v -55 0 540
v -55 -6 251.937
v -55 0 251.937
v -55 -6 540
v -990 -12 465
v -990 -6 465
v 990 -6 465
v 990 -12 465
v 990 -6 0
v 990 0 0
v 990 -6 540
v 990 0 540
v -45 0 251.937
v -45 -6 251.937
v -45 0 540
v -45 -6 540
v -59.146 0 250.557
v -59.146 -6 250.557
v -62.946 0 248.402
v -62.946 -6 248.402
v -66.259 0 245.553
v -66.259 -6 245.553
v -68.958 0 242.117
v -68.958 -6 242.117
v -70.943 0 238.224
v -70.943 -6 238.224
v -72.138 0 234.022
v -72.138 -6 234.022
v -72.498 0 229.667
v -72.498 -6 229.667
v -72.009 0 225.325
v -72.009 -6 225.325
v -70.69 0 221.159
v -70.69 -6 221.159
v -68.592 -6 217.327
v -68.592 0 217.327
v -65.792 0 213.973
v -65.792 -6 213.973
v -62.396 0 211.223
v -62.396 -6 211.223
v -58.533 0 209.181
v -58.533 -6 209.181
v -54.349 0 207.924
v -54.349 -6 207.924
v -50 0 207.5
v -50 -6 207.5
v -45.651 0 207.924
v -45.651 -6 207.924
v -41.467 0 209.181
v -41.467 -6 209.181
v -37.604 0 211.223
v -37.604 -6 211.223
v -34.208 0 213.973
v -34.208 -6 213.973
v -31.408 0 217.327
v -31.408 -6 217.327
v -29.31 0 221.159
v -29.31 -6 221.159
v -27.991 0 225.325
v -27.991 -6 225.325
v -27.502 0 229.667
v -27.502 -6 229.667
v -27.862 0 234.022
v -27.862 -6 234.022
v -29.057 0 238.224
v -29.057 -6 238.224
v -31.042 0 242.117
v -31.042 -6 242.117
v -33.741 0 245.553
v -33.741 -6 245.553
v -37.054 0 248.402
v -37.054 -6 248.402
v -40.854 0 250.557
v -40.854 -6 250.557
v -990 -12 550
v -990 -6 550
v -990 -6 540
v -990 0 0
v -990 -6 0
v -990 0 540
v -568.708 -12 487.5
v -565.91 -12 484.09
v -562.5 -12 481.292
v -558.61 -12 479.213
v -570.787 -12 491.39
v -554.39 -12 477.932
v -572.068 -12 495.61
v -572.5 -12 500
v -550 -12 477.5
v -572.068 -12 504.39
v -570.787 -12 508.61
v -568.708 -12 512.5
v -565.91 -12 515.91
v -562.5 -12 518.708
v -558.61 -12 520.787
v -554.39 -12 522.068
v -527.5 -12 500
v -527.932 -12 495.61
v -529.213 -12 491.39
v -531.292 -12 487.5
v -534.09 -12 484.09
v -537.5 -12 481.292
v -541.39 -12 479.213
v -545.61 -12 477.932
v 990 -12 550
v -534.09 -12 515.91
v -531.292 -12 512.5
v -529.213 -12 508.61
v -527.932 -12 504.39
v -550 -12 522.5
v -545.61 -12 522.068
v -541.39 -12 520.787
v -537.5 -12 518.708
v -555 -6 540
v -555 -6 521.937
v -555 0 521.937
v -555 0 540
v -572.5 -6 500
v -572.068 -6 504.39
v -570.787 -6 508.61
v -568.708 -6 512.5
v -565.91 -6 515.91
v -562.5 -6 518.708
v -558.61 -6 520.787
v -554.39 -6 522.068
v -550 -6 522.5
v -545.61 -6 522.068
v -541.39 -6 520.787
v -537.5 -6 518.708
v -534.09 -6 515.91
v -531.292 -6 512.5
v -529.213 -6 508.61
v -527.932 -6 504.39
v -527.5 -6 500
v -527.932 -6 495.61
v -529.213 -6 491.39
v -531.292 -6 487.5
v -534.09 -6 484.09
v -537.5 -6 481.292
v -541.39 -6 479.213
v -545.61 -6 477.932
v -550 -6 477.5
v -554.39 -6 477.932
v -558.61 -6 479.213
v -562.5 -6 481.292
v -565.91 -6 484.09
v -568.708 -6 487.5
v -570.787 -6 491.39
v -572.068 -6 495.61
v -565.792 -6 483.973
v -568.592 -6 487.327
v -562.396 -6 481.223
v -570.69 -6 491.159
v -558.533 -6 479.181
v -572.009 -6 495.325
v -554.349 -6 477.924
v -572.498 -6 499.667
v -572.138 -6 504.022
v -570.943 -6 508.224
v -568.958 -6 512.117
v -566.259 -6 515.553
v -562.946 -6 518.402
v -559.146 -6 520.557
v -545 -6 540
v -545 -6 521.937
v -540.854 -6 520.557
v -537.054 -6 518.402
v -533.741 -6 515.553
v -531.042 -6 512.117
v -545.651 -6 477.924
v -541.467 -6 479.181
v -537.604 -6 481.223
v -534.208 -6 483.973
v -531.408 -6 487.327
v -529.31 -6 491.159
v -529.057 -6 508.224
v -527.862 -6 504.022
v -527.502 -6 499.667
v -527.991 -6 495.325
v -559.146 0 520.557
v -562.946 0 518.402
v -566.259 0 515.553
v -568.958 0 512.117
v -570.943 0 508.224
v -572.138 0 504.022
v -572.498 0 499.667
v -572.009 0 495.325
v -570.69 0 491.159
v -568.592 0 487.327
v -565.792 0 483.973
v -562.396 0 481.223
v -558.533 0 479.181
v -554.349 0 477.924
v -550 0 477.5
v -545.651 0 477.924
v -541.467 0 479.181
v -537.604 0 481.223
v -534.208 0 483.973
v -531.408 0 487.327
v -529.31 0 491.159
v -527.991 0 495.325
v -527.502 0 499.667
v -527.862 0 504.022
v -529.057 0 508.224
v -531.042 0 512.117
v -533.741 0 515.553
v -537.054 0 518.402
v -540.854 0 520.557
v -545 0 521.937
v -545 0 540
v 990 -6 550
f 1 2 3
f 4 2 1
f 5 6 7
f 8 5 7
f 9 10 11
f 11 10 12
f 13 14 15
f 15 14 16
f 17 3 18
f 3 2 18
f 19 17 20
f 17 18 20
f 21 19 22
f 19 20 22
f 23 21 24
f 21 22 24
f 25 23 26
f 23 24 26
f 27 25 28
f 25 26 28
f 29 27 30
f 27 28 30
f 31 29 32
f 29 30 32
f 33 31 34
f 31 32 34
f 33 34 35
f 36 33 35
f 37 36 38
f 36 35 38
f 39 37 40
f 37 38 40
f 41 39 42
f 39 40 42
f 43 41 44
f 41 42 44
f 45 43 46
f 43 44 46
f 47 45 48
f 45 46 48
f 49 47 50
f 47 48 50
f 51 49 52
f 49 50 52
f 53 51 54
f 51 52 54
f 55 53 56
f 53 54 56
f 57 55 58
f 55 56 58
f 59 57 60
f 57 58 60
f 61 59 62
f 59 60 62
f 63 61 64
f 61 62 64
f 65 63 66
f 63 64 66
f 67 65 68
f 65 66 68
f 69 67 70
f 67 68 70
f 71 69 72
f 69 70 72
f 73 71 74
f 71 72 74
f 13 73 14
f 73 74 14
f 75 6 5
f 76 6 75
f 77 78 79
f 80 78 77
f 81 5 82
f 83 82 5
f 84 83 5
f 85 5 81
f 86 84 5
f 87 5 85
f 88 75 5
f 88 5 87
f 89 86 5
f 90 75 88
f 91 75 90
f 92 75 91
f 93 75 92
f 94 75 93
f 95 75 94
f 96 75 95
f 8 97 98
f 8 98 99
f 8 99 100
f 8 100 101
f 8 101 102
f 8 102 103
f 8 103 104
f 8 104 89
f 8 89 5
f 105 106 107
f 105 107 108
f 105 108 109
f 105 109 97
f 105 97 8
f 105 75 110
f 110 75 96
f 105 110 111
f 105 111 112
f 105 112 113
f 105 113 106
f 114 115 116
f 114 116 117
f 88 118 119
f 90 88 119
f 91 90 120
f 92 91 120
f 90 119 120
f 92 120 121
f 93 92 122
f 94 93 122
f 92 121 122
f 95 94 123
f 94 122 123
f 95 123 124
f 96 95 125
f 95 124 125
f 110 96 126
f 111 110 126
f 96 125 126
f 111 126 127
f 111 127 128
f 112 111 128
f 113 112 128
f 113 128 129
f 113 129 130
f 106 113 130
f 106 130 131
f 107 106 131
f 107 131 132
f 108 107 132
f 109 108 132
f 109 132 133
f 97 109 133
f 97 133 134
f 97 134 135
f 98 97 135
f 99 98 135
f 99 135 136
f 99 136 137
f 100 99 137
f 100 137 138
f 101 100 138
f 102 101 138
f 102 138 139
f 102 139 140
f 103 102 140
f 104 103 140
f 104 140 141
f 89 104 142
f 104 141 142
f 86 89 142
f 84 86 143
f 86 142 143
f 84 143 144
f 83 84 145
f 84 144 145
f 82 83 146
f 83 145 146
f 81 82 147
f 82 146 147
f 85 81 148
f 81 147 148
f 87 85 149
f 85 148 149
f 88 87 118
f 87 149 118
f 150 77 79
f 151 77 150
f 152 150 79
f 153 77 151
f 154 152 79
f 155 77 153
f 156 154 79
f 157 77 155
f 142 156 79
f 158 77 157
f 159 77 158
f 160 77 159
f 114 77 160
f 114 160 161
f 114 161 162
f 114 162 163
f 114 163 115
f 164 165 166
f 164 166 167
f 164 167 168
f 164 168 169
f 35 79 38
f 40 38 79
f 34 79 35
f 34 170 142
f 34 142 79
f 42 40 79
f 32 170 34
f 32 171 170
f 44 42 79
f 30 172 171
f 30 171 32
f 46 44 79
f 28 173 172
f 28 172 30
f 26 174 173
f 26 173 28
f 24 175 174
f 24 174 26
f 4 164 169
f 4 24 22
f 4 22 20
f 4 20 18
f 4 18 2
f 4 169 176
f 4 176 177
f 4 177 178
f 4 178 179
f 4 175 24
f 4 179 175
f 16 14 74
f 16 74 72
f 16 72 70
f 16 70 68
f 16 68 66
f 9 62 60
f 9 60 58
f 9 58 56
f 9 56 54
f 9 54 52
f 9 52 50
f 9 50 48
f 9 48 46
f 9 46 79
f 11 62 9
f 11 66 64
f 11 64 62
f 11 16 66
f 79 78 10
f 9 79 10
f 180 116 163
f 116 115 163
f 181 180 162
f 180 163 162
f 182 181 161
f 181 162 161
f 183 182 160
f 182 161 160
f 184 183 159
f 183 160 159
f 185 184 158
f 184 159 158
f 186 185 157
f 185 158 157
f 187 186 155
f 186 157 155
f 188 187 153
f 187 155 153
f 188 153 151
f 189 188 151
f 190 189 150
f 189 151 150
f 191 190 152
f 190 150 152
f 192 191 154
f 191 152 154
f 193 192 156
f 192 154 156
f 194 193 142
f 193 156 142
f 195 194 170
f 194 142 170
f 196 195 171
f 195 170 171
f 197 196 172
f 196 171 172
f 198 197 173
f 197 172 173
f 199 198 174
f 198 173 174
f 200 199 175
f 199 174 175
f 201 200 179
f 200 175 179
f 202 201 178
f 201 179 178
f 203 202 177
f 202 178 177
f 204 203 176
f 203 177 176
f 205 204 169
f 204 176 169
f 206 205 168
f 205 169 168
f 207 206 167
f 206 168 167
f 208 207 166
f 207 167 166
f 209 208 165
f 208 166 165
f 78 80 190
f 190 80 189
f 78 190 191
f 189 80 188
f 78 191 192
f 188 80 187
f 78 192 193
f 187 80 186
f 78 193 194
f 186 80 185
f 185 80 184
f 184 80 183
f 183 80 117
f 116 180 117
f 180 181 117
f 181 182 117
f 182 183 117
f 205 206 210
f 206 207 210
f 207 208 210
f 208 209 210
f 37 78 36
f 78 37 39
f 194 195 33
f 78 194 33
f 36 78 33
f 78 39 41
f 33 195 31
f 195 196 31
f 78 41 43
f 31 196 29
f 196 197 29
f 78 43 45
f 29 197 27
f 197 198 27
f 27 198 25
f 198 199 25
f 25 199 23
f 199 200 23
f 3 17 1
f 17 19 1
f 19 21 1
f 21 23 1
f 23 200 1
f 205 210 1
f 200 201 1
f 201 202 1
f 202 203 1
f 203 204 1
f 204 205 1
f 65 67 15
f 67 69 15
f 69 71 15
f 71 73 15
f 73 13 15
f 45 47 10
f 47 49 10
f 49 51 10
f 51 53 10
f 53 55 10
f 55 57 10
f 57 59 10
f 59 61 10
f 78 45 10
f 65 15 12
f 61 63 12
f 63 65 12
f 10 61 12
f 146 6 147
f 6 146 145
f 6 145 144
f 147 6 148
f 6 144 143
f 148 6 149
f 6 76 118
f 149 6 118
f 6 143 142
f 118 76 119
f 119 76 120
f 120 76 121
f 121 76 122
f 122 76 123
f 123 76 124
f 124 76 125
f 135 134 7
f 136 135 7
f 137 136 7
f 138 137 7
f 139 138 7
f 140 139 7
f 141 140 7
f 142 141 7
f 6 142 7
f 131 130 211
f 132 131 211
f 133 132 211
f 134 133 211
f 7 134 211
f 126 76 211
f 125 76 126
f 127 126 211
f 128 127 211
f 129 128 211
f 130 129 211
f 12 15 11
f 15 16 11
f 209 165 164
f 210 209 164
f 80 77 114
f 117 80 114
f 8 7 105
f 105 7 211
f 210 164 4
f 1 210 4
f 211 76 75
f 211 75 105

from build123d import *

# Parameters (mm, degrees)
F0_W      = 1980
F0_H      = 550
F1_DEPTH  = 6
F2_W      = 1980
F2_H      = 85
F3_DEPTH  = 6
F4_R      = 22.5
F5_DEPTH  = 6.001
F6_W      = 10
F6_H      = 320
F6_H_2    = 50
F7_DEPTH  = 6.001
F8_W      = 1980
F8_H      = 10
F9_DEPTH  = 6.001
F10_R     = 22.5
F11_DEPTH = 25


with BuildPart() as f1:
    # F0 (on Front) → F1 (new body)
    with BuildSketch(Plane.XZ):
        with Locations((0, 275)):
            Rectangle(F0_W, F0_H)
    extrude(amount=F1_DEPTH)

    # F4 (on face) → F5 (cut, through all)
    with BuildSketch(Plane.XZ.offset(6)):
        with Locations((-50, 230)):
            Circle(F4_R)
        with Locations((-550, 500)):
            Circle(F4_R)
    extrude(amount=-F5_DEPTH, mode=Mode.SUBTRACT)

    # F6 (on face) → F7 (cut, through all)
    with BuildSketch(Plane.XZ.offset(6)):
        with Locations((-50, 390)):
            Rectangle(F6_W, F6_H)
        with Locations((-550, 525)):
            Rectangle(F6_W, F6_H_2)
    extrude(amount=-F7_DEPTH, mode=Mode.SUBTRACT)

    # F8 (on face) → F9 (cut, through all)
    with BuildSketch(Plane.XZ.offset(6)):
        with Locations((0, 545)):
            Rectangle(F8_W, F8_H)
    extrude(amount=-F9_DEPTH, mode=Mode.SUBTRACT)


with BuildPart() as f3:
    # F2 (on face) → F3 (new body)
    with BuildSketch(Plane.XZ.offset(6)):
        with Locations((0, 507.5)):
            Rectangle(F2_W, F2_H)
    extrude(amount=F3_DEPTH)

    # F10 (on face) → F11 (cut)
    with BuildSketch(Plane(origin=(0, -6, 0), x_dir=(-1, 0, 0), z_dir=(0, 1, 0))):
        with Locations((550, 500)):
            Circle(F10_R)
    extrude(amount=-F11_DEPTH, mode=Mode.SUBTRACT)


solid = Compound([f1.part, f3.part])
